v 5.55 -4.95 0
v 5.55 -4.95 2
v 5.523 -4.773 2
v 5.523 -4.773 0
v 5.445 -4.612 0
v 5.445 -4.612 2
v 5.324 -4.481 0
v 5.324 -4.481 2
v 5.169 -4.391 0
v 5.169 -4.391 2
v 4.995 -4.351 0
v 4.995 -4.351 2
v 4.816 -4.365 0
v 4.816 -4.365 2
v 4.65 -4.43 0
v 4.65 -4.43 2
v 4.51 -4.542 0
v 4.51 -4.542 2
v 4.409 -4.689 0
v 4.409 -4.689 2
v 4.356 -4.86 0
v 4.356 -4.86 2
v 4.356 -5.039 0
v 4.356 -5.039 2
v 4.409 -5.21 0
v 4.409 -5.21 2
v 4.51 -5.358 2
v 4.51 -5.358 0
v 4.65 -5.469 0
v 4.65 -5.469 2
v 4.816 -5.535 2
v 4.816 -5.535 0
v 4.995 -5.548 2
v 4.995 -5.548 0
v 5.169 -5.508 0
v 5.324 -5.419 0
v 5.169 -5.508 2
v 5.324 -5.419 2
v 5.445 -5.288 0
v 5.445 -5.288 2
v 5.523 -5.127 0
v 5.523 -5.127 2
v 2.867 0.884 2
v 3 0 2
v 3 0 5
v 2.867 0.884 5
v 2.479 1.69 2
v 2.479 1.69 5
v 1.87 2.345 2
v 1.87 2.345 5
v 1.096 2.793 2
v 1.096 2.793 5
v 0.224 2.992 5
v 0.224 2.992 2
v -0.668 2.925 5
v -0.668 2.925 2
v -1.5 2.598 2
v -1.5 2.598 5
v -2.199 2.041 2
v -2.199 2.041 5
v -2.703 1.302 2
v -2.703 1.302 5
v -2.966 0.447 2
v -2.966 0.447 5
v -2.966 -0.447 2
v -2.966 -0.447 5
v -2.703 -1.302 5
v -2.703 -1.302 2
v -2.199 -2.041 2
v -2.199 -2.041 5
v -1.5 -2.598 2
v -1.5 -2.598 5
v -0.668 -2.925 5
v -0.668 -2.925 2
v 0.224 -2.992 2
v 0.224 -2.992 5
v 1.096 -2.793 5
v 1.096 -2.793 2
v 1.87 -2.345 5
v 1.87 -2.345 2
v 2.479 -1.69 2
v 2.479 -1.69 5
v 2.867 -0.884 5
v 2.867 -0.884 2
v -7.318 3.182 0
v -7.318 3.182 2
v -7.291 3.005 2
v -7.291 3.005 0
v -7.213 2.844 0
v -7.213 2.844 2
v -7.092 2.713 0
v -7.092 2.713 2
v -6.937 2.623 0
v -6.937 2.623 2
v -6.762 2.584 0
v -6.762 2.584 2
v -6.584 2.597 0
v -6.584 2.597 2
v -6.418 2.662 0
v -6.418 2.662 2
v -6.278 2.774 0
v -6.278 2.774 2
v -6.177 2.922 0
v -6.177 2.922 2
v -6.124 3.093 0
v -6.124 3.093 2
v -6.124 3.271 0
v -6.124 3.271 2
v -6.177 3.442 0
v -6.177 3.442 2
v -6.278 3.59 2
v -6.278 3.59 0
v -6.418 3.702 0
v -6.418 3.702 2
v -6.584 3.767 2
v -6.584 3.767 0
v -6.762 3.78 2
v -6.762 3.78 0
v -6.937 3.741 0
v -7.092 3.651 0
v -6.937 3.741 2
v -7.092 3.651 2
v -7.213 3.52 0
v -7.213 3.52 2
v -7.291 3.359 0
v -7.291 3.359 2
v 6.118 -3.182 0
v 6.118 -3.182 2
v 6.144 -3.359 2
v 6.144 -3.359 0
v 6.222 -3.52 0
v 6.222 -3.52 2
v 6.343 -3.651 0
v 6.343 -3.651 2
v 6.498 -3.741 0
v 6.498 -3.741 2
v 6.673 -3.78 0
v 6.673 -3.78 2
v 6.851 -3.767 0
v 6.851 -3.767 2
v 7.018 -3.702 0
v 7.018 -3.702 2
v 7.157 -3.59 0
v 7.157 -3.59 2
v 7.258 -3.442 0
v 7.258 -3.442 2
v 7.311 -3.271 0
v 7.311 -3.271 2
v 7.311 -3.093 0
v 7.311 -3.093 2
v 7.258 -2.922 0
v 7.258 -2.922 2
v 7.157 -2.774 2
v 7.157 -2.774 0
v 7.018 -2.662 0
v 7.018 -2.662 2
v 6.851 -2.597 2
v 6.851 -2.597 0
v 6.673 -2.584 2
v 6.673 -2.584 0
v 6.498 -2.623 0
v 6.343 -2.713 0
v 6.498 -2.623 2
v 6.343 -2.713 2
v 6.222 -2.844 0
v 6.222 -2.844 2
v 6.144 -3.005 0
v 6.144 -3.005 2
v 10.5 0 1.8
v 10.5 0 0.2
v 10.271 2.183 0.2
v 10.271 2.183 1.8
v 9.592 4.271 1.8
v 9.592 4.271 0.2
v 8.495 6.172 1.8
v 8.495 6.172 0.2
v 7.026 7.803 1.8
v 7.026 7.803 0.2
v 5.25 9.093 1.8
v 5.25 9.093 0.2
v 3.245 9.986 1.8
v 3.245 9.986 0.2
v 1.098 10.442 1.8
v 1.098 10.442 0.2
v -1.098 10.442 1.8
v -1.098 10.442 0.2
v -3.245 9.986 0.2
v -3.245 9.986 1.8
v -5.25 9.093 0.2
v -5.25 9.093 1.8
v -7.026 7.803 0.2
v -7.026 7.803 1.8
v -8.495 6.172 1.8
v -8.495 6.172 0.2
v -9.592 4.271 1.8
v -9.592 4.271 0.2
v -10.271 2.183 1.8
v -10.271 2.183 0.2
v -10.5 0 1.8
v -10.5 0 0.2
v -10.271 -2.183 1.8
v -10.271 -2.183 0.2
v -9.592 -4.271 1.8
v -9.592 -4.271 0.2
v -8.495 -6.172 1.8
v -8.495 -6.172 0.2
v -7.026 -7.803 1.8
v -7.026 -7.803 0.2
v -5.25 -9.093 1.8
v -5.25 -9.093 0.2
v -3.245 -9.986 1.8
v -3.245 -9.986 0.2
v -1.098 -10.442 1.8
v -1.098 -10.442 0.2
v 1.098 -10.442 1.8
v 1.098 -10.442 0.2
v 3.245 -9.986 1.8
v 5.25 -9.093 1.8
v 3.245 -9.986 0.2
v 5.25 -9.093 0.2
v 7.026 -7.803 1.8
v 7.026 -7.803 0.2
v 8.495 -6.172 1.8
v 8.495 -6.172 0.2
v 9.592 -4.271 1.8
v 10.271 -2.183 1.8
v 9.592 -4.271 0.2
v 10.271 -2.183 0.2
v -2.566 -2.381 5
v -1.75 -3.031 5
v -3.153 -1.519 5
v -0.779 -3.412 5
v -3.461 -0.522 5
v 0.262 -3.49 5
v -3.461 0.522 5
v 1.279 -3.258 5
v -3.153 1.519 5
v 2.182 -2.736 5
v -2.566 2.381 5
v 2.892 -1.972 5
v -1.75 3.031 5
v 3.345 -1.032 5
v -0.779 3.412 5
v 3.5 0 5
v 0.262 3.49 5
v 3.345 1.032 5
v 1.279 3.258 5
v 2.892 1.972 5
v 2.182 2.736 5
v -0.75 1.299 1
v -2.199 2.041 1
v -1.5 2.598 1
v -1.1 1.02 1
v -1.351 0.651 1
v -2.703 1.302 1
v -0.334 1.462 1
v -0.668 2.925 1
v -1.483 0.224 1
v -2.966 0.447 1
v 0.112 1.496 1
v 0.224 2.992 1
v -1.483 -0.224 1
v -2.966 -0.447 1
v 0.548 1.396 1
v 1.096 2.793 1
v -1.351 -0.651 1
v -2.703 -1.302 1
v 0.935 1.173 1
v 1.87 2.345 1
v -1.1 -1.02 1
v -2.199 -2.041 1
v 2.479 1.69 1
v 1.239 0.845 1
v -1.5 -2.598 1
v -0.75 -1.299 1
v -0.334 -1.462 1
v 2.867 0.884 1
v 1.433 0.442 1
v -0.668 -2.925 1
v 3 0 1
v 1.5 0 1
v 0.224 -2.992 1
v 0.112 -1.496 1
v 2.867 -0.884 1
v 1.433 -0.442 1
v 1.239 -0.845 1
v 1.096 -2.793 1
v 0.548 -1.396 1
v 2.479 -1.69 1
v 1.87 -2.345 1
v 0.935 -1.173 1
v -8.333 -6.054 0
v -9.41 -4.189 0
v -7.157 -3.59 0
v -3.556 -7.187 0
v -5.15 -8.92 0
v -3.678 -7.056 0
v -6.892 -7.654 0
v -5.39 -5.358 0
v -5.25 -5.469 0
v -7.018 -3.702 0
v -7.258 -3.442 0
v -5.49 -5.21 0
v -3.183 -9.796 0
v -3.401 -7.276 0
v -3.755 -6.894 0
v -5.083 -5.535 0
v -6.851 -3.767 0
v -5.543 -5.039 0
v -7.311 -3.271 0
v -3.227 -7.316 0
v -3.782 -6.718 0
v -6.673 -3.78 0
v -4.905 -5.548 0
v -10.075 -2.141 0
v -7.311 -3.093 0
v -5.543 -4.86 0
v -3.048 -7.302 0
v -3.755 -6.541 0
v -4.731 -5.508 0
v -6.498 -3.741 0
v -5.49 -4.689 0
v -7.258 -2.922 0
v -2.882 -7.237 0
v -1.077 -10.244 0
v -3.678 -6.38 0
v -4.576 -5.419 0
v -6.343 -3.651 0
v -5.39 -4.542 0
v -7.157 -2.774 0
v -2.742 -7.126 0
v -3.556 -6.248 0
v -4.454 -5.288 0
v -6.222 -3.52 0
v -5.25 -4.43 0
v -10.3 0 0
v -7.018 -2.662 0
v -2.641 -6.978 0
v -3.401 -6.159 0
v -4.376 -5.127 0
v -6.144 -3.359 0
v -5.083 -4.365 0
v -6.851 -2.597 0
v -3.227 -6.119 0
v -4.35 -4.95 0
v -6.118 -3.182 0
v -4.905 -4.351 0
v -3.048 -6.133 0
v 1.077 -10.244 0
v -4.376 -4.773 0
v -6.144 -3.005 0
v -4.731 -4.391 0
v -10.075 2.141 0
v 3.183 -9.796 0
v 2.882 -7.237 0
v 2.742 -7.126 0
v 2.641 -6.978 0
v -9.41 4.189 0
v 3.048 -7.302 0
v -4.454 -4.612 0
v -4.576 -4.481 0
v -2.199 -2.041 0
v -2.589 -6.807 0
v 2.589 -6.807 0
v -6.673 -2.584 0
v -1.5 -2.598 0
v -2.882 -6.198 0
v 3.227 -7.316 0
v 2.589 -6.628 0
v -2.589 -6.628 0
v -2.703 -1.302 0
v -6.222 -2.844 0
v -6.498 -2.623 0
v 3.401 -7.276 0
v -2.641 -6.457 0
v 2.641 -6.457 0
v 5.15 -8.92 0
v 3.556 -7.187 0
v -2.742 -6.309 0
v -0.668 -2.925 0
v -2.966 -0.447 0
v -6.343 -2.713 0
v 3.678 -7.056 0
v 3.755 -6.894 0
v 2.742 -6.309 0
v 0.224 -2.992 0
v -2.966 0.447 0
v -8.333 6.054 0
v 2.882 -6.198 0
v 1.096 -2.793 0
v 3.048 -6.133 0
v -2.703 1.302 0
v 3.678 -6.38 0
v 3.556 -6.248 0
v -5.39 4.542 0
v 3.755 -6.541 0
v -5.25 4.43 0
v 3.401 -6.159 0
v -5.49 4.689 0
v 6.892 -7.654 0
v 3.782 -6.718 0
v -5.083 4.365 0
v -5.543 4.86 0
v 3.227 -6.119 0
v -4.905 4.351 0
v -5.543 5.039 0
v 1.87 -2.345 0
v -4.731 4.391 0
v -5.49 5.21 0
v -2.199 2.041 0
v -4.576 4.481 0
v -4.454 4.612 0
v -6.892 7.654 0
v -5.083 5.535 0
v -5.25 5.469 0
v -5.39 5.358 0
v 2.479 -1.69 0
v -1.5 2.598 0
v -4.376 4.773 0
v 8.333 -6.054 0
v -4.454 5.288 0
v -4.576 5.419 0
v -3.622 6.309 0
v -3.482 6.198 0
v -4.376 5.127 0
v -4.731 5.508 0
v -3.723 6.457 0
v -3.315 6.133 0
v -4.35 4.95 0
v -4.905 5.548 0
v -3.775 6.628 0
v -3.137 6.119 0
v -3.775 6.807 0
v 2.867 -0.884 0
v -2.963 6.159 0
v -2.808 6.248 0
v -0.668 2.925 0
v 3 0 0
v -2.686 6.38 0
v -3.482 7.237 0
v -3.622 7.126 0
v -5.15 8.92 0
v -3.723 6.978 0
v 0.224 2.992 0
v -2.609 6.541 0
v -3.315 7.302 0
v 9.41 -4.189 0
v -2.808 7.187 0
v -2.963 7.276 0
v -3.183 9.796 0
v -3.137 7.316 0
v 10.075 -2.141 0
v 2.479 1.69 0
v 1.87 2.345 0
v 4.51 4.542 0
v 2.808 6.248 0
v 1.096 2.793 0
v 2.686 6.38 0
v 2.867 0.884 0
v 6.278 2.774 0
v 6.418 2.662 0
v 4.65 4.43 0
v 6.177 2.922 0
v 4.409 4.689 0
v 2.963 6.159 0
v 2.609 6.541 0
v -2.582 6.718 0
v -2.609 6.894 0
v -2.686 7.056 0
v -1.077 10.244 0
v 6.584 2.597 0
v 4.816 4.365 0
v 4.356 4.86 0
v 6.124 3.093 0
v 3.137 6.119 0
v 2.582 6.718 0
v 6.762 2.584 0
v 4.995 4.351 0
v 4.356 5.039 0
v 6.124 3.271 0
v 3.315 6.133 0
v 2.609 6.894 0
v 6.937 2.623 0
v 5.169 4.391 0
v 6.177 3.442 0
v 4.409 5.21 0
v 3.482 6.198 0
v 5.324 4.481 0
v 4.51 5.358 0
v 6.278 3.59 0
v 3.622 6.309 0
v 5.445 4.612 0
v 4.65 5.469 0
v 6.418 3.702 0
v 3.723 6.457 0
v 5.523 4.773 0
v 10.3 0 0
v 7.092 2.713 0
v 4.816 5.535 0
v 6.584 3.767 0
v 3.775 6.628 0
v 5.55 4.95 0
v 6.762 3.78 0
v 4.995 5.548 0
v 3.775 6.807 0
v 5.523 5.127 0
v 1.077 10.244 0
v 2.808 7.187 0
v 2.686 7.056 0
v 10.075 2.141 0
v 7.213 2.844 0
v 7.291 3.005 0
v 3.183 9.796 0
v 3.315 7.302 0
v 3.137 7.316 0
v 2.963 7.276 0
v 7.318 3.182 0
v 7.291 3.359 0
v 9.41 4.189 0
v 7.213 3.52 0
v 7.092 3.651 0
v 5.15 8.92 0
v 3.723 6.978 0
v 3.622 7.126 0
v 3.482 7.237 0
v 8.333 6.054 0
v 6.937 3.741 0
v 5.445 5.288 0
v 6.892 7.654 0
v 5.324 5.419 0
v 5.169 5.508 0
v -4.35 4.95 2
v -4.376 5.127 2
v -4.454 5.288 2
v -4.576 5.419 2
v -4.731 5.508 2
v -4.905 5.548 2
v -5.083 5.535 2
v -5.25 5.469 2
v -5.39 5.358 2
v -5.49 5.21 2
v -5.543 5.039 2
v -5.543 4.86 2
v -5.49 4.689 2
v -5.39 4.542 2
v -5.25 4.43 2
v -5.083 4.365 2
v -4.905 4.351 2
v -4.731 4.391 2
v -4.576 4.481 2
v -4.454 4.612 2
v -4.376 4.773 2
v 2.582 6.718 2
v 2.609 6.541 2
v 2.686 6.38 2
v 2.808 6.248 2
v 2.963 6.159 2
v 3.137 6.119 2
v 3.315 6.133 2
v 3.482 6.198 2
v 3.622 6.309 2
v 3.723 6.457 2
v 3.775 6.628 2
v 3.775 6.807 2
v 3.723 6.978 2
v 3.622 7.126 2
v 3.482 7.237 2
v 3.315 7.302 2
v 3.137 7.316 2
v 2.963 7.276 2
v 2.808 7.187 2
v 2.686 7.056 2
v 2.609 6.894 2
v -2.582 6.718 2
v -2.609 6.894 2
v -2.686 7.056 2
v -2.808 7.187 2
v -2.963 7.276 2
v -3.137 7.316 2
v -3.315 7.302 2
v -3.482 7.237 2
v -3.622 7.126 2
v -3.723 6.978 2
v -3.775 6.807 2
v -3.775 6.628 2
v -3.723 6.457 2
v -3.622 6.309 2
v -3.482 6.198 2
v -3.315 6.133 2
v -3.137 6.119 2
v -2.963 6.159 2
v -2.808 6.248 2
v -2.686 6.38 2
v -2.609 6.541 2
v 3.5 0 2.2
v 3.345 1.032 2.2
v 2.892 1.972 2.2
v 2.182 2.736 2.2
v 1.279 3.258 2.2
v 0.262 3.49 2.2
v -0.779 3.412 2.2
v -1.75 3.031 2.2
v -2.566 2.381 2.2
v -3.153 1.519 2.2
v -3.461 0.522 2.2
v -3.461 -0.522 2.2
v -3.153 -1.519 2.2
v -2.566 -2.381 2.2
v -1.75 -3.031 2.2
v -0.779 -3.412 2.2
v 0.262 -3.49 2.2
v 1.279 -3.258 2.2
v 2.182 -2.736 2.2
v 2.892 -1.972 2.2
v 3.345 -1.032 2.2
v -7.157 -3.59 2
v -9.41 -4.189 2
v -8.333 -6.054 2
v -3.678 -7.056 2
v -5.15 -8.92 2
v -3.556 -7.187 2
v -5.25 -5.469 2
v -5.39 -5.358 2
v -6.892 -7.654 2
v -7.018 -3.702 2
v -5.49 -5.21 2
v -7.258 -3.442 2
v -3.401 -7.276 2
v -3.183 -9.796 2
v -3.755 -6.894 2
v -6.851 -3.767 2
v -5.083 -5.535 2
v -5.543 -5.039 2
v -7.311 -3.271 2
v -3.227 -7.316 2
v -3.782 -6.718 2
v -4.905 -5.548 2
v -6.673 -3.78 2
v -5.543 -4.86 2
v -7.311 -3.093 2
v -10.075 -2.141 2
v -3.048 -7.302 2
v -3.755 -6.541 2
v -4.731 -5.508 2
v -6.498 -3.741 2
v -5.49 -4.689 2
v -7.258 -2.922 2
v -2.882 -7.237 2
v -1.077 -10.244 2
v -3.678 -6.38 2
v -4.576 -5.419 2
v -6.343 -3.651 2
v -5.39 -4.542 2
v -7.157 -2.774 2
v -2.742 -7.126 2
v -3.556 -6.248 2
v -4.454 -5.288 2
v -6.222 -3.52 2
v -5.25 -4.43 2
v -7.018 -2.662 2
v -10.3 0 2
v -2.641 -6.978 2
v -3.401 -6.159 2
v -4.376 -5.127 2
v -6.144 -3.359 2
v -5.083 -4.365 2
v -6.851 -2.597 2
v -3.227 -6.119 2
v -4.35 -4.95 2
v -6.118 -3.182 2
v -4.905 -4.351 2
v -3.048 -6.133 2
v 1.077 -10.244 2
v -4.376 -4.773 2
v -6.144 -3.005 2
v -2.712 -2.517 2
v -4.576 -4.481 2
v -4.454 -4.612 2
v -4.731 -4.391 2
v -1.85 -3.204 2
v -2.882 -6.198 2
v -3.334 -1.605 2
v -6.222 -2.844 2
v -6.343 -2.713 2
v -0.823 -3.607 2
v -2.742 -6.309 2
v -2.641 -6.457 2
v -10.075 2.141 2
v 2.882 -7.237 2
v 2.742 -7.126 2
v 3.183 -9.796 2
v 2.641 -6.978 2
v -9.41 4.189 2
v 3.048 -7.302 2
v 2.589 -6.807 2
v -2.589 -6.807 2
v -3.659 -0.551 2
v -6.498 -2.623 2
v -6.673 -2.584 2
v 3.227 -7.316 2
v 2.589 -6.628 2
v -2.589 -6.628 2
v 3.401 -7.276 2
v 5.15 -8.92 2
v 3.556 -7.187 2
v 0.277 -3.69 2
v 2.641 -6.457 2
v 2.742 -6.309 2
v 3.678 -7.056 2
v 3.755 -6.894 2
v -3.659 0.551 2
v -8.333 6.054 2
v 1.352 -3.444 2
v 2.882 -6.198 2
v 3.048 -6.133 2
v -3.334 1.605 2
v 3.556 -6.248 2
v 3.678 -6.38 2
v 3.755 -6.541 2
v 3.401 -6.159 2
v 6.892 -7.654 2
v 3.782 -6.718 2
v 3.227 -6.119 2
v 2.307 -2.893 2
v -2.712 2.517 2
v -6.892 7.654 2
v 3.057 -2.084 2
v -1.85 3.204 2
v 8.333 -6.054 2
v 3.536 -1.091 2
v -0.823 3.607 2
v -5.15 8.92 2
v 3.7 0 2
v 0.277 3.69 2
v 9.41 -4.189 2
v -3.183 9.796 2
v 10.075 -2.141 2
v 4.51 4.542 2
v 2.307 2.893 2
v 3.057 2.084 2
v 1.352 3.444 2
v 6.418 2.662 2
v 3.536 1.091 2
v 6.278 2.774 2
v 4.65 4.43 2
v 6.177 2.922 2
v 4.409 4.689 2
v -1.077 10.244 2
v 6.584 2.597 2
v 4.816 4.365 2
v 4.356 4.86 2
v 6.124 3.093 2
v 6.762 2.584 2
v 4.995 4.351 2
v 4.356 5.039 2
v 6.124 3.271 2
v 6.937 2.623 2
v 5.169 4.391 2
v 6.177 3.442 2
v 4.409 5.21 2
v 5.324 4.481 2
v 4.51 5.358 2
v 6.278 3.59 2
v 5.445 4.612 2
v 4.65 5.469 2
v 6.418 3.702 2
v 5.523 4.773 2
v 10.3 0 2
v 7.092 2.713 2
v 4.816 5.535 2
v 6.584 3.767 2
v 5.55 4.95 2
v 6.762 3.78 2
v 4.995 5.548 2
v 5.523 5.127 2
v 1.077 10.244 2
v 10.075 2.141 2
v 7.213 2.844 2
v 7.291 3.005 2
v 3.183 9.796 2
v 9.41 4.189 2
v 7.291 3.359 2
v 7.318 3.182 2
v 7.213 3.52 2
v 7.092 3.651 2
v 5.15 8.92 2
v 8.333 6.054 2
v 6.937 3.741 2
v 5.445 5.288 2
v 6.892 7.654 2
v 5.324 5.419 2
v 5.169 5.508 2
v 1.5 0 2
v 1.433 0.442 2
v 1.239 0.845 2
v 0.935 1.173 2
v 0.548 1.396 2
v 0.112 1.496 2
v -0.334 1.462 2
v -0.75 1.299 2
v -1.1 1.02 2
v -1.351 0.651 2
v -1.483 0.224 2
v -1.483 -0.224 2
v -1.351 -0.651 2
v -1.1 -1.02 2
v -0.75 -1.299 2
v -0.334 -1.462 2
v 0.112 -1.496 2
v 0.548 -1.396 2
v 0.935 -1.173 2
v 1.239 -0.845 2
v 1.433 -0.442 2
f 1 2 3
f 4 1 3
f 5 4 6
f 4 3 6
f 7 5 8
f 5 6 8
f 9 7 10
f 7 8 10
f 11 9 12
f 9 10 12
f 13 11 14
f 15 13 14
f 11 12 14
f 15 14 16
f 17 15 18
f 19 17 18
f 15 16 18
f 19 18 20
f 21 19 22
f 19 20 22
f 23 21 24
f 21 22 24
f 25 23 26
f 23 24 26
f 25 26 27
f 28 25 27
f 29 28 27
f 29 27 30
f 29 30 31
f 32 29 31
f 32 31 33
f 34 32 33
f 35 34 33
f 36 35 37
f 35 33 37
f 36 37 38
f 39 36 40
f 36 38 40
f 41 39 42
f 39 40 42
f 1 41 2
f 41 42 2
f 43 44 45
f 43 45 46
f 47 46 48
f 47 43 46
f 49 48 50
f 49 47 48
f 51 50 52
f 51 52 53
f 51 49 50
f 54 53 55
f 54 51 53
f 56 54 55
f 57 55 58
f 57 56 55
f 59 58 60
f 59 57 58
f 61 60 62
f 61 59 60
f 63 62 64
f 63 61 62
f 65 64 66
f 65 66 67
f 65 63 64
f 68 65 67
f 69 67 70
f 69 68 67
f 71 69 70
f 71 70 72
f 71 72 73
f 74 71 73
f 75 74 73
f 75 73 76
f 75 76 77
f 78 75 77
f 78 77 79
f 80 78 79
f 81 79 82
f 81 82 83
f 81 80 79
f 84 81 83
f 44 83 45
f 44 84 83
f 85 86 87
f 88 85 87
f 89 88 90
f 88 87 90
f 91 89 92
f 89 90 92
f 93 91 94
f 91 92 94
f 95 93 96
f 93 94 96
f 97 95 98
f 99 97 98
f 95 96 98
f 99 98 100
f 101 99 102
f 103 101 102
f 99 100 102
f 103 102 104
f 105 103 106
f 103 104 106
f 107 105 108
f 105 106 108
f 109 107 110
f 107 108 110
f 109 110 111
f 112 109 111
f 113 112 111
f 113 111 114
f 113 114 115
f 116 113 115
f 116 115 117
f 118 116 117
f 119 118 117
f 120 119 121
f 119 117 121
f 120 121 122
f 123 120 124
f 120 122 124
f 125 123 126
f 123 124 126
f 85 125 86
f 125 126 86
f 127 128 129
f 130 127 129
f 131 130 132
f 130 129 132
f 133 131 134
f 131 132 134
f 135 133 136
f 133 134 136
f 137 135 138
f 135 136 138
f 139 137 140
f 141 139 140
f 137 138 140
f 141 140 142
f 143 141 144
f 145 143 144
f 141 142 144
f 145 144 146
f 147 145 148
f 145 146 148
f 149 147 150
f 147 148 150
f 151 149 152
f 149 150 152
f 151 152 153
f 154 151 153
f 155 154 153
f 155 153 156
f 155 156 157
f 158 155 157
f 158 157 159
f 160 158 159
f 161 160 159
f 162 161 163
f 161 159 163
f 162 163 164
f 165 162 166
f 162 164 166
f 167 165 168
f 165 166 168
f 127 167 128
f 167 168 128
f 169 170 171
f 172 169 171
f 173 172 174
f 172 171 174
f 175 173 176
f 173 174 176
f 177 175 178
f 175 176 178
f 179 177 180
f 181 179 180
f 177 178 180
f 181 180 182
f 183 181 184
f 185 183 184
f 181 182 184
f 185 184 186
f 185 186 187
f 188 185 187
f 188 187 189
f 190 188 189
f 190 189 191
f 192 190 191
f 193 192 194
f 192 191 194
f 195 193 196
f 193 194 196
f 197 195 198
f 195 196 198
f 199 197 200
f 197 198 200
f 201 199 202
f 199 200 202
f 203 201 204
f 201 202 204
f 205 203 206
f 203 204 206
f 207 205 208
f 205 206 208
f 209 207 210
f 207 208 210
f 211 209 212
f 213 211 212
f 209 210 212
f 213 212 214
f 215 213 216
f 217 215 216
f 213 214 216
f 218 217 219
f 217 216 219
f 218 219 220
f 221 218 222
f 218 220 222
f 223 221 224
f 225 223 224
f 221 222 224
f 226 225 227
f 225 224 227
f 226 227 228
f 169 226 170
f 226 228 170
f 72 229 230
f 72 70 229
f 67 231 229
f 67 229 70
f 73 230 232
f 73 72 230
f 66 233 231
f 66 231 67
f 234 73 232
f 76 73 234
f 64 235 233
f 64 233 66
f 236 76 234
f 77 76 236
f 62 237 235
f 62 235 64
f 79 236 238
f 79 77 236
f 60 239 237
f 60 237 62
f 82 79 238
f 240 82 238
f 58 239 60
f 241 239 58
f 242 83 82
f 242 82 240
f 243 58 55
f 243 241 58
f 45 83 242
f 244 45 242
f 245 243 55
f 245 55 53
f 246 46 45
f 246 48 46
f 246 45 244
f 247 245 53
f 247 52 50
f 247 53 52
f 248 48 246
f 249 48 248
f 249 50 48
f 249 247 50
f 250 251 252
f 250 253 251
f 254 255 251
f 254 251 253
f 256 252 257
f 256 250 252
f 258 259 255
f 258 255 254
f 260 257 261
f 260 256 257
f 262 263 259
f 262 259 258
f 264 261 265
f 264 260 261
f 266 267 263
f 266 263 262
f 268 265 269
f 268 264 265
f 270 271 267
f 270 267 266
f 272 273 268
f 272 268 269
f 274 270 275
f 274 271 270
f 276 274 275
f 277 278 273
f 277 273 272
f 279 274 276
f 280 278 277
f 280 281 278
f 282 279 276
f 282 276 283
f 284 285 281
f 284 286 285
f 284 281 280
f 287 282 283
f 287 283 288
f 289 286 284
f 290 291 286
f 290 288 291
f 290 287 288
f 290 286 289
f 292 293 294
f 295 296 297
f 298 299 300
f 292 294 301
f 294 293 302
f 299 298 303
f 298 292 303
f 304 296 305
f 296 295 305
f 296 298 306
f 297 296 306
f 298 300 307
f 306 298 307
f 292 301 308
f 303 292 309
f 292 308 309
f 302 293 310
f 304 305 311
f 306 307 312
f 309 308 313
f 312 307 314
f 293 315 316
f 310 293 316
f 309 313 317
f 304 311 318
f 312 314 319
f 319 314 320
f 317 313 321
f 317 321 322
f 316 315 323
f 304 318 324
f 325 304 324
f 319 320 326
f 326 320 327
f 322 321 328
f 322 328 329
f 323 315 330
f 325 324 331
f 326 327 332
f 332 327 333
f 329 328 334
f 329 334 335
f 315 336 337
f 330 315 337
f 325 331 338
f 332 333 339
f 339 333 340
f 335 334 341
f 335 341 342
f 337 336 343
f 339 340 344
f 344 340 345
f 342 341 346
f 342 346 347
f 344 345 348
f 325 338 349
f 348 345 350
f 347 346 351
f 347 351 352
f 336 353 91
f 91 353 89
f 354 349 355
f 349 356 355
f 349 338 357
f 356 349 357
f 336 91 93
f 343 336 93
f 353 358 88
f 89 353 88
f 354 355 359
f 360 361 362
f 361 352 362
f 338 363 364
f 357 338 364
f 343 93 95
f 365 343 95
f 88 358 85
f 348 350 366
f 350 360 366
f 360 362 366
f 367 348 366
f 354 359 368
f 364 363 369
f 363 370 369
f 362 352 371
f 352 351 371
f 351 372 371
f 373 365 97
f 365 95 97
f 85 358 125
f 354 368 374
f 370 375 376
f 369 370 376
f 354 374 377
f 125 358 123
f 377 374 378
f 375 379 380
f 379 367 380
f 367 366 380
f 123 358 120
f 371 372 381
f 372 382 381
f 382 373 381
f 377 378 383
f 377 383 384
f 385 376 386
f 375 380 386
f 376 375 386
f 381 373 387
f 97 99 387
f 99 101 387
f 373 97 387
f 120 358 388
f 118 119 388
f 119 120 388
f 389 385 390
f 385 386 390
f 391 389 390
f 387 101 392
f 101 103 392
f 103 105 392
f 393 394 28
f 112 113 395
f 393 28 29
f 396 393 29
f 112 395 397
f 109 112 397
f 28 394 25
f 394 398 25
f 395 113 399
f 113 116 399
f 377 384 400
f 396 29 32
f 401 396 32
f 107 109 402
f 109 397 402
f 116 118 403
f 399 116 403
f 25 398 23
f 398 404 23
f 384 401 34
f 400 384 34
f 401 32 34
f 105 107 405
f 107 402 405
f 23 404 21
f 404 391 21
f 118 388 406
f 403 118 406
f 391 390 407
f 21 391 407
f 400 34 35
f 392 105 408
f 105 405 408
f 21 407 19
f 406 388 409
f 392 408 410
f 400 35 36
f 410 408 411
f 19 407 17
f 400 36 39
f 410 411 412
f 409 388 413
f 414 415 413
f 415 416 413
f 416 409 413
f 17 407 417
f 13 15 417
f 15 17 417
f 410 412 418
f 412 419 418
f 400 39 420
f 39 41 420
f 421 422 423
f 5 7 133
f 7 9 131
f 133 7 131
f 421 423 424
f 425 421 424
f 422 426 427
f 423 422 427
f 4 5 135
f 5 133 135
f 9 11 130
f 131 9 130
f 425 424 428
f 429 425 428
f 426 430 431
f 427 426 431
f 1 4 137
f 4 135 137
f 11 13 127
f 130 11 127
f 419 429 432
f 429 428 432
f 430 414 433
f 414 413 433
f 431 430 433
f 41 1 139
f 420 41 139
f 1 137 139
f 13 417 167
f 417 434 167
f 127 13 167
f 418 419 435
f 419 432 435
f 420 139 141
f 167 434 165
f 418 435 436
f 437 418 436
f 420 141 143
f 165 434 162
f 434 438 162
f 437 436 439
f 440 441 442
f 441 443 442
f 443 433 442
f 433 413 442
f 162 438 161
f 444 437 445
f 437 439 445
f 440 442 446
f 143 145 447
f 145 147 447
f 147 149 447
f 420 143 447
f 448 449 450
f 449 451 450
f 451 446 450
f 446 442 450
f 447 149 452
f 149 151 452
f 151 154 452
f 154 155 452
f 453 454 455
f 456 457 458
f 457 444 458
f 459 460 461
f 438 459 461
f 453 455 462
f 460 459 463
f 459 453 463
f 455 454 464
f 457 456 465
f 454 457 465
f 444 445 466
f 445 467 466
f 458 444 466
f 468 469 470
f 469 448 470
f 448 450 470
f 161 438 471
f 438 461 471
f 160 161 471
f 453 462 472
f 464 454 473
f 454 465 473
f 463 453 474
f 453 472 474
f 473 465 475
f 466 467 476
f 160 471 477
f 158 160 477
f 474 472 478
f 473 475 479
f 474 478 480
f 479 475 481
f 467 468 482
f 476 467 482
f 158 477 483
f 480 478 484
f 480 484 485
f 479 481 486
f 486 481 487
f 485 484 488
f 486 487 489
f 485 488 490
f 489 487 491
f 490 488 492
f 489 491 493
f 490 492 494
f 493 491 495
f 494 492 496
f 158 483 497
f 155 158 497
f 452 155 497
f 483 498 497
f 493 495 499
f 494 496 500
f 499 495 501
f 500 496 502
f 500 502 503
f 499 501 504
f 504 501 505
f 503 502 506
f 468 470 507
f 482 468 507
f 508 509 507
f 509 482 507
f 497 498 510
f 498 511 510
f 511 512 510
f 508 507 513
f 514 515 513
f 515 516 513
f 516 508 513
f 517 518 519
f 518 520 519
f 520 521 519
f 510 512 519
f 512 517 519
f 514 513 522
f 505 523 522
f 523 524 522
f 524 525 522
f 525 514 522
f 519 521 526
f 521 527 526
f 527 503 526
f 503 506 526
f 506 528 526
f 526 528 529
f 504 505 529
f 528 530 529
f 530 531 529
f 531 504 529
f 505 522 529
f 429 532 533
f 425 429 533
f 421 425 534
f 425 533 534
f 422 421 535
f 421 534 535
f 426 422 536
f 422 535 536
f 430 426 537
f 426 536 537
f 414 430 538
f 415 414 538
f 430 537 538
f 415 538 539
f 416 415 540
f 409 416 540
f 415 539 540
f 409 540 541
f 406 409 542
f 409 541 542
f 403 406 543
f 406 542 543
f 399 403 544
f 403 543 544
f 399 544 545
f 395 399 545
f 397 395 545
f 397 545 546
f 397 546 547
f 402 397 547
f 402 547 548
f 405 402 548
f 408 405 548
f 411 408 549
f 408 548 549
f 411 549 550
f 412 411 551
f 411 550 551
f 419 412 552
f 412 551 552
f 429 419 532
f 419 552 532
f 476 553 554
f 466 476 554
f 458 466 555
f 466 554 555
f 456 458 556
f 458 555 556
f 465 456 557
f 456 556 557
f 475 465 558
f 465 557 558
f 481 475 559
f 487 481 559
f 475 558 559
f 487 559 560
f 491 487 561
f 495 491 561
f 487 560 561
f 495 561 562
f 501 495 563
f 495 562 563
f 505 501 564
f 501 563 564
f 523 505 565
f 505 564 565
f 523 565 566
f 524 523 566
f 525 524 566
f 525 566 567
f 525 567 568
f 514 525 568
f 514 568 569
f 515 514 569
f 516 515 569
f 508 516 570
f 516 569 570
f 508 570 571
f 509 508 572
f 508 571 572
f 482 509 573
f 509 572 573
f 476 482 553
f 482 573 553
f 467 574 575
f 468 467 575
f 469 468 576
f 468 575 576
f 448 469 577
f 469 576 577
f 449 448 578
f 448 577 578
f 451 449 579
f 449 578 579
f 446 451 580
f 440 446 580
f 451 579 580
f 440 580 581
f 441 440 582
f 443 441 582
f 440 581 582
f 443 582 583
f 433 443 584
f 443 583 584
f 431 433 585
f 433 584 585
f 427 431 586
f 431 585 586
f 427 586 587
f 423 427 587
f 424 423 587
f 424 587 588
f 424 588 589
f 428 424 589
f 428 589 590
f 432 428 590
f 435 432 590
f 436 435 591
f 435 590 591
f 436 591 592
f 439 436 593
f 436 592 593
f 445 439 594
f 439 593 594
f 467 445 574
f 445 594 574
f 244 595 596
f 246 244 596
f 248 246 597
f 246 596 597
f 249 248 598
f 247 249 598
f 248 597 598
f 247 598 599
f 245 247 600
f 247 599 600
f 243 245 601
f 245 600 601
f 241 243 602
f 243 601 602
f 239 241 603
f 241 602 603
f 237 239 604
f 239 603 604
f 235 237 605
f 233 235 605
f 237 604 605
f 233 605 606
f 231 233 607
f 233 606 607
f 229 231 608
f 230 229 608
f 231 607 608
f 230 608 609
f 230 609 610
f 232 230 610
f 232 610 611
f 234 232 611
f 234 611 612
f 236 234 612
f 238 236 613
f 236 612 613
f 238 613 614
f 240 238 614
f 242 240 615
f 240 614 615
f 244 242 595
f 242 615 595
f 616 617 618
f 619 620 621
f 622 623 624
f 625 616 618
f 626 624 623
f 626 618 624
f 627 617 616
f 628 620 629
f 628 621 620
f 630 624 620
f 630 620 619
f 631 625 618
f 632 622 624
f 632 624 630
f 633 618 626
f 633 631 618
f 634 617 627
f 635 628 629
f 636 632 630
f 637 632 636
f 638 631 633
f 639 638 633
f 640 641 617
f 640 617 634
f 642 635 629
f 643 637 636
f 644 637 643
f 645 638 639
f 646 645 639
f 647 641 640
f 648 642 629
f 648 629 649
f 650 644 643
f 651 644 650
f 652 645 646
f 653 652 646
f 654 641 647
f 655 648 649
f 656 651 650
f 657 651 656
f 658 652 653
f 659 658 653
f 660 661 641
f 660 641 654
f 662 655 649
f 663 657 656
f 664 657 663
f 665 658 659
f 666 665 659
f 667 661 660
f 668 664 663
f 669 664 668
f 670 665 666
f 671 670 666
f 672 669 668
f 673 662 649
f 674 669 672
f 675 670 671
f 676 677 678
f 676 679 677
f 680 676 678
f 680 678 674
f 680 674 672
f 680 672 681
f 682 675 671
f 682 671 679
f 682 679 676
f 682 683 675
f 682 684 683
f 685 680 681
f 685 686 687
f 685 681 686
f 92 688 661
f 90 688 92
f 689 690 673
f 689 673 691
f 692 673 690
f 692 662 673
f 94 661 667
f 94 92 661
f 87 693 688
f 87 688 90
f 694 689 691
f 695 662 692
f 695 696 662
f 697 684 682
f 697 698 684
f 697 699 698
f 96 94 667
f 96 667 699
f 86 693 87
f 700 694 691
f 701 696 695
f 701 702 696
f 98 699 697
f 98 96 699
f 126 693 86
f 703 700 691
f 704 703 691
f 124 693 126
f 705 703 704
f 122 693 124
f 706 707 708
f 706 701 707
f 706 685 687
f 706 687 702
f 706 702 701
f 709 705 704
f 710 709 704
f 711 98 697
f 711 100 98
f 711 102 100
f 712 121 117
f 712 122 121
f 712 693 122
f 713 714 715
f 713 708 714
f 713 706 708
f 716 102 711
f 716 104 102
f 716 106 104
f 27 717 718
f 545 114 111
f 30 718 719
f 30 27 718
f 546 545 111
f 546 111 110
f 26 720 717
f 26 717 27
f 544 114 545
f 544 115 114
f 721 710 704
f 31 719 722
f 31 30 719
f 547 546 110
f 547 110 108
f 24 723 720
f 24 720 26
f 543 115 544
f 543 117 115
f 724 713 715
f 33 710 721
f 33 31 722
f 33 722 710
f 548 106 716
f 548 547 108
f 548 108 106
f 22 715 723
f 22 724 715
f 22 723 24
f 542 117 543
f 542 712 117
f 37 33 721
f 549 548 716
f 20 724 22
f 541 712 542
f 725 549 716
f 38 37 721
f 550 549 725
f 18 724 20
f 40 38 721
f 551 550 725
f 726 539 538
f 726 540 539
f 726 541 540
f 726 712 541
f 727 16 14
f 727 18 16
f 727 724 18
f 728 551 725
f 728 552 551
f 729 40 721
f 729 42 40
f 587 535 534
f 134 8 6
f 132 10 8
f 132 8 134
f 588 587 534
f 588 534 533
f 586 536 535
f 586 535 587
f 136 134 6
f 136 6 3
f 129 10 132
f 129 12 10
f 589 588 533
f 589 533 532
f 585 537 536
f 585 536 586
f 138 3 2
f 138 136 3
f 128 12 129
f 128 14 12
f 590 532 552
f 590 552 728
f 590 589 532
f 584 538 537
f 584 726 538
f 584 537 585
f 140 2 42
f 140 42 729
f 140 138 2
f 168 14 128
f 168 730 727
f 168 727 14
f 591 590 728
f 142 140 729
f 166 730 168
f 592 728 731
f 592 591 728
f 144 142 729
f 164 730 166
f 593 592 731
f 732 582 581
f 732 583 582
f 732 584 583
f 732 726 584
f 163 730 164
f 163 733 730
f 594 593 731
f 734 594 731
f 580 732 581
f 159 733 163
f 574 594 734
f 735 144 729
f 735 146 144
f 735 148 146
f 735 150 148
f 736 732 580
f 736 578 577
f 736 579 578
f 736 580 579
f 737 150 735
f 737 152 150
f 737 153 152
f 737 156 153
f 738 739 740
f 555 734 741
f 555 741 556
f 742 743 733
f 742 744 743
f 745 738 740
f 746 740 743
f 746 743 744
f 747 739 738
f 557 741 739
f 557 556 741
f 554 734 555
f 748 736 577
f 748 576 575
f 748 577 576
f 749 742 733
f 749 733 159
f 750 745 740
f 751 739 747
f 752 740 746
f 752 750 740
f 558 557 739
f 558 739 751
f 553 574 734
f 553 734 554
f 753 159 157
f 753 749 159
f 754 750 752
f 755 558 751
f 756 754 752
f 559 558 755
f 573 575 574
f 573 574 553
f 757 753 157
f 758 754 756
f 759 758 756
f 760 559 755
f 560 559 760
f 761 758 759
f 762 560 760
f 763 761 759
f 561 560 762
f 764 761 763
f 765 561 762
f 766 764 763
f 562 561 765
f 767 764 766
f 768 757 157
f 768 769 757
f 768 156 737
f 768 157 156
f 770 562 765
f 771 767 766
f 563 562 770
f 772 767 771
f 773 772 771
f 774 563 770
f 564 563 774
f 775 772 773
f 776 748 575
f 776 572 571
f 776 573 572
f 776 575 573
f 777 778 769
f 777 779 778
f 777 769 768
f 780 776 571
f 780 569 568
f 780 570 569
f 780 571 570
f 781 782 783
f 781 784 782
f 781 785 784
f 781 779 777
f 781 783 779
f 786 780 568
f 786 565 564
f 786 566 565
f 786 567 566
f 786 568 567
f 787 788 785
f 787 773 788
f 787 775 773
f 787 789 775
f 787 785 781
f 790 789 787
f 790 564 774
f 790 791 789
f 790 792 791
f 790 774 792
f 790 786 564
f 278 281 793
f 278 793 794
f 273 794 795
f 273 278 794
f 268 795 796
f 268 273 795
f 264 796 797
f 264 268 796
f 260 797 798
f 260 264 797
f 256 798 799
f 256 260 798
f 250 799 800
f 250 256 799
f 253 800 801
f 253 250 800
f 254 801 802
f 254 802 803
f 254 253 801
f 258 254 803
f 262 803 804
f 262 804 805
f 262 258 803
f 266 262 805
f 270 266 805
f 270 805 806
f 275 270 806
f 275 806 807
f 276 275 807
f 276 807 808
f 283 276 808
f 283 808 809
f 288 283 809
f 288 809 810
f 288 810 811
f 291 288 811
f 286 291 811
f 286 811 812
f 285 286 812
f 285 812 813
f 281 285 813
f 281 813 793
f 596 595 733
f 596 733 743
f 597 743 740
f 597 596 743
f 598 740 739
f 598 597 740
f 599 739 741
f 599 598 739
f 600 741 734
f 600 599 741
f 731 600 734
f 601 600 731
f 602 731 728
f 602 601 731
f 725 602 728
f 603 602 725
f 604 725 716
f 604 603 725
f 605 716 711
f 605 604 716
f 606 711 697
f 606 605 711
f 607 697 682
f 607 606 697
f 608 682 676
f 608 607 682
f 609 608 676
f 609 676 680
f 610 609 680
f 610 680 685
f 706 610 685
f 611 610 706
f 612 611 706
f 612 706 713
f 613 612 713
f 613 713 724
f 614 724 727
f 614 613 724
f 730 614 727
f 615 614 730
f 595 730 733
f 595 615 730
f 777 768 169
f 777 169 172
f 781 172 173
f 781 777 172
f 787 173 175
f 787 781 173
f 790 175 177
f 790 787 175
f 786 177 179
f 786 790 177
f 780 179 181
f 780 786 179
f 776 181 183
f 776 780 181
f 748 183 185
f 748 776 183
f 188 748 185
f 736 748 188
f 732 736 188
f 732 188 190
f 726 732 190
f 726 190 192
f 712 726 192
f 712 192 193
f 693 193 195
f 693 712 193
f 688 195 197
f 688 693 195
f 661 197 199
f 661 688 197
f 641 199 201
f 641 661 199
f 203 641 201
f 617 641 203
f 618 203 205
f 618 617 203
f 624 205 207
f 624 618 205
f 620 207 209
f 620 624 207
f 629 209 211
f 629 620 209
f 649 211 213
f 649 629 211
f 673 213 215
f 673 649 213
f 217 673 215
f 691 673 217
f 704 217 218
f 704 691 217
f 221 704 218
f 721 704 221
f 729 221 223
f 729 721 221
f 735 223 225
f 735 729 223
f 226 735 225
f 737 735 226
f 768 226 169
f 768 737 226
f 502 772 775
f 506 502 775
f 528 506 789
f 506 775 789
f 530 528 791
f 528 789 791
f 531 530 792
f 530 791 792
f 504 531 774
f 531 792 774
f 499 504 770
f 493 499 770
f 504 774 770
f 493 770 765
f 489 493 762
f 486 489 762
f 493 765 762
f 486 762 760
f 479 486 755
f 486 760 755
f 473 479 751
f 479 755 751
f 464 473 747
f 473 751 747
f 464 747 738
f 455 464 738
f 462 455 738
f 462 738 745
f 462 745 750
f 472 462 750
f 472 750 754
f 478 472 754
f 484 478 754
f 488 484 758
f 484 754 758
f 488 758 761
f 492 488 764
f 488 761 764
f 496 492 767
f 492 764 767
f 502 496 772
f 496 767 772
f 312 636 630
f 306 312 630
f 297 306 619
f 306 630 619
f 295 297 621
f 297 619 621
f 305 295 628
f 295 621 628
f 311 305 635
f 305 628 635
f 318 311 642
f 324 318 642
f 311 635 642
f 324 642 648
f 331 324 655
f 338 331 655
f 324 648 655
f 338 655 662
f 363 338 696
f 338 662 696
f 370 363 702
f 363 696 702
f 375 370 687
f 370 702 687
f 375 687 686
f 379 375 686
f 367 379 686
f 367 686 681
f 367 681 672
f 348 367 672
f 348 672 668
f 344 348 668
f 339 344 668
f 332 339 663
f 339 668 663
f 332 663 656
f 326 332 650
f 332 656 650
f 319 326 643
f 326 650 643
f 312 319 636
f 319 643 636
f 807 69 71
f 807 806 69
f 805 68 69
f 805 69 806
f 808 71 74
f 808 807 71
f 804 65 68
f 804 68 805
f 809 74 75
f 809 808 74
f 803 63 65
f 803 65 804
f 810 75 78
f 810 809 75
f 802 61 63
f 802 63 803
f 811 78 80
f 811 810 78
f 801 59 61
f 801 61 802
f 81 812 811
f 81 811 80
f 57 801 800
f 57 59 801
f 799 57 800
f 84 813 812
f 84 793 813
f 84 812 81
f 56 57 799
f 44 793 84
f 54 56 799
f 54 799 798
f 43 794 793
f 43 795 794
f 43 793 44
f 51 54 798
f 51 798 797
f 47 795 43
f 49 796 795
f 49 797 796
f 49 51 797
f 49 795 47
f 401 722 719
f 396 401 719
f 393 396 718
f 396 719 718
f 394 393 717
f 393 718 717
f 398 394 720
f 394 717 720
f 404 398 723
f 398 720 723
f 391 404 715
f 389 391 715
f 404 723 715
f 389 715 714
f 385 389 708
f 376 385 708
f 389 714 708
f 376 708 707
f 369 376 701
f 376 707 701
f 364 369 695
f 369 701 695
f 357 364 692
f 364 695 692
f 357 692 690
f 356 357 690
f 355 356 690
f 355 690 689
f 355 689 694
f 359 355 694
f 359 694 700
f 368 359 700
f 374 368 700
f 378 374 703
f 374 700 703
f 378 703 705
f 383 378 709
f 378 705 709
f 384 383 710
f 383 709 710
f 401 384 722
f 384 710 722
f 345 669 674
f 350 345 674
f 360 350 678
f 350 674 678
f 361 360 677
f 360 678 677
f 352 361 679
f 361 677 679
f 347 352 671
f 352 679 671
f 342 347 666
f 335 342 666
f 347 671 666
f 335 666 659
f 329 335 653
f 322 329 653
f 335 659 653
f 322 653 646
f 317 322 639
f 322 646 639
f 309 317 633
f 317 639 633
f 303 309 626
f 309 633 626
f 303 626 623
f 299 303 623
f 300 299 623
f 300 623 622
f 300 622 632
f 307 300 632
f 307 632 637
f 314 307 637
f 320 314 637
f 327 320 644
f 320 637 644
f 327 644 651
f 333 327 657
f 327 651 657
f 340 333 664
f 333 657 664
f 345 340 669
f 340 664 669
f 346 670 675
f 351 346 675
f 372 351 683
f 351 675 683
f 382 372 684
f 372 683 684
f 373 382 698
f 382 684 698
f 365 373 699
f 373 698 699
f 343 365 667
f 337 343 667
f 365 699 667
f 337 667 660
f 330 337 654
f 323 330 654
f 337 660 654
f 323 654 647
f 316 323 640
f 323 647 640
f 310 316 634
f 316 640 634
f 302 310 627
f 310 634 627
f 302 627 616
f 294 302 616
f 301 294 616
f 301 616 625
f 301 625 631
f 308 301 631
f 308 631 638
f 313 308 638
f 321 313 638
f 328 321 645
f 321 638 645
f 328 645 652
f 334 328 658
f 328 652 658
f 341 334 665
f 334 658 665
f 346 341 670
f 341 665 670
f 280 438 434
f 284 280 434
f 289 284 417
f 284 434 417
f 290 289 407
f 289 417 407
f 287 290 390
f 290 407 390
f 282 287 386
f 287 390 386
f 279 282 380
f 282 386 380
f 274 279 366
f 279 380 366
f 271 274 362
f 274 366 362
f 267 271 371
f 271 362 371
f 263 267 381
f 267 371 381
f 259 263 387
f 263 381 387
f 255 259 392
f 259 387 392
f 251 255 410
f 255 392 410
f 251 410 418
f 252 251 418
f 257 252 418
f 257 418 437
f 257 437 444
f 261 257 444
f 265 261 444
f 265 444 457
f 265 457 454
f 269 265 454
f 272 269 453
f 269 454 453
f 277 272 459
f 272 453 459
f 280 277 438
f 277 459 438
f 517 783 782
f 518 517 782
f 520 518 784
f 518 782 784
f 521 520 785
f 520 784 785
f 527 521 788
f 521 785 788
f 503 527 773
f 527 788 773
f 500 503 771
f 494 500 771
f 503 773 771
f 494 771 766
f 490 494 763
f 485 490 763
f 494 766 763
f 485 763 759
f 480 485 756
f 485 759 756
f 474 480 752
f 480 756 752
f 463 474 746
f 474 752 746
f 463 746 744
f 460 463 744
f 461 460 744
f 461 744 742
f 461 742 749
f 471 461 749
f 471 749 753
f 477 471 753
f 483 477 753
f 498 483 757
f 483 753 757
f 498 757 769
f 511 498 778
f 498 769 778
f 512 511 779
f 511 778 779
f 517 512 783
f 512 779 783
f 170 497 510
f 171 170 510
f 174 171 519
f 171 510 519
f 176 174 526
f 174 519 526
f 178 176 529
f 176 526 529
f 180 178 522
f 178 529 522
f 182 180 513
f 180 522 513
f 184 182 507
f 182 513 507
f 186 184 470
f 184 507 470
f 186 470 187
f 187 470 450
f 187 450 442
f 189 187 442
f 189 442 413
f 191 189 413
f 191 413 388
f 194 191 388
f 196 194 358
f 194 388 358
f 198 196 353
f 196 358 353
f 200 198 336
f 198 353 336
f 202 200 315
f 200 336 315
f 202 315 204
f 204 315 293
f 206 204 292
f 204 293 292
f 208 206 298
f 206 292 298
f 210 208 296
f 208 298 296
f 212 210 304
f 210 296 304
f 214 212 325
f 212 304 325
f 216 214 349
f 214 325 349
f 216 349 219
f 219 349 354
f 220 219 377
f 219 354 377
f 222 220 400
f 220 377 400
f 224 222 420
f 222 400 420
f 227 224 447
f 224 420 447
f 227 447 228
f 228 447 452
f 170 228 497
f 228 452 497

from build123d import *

# Parameters (mm, degrees)
SKETCH_1_R          = 10.5
SKETCH_1_R_2        = 1.5
EXTRUDE_1_DEPTH     = 2
SKETCH_2_R          = 3.5
SKETCH_2_R_2        = 3
EXTRUDE_2_DEPTH     = 3
SKETCH_3_R          = 3
CUT_EXTRUDE_1_DEPTH = 1
SKETCH_4_R          = 0.6
CUT_EXTRUDE_2_DEPTH = 2
CHAMFER_1_SIZE      = 0.2


with BuildPart() as part:
    # 草图1 → 凸台-拉伸1 (new body)
    with BuildSketch(Plane.XY):
        Circle(SKETCH_1_R)
        Circle(SKETCH_1_R_2, mode=Mode.SUBTRACT)
    extrude(amount=EXTRUDE_1_DEPTH)

    # 草图2 → 凸台-拉伸2 (add)
    with BuildSketch(Plane.XY.offset(2)):
        Circle(SKETCH_2_R)
        Circle(SKETCH_2_R_2, mode=Mode.SUBTRACT)
    extrude(amount=EXTRUDE_2_DEPTH)

    # 草图3 → 切除-拉伸1 (cut)
    with BuildSketch(Plane(origin=(0, 0, 0), x_dir=(-1, 0, 0), z_dir=(0, 0, -1))):
        with Locations(Location((0, 0, 0), (0, 0, 180))):
            Circle(SKETCH_3_R)
    extrude(amount=-CUT_EXTRUDE_1_DEPTH, mode=Mode.SUBTRACT)

    # 草图4 → 切除-拉伸2 (cut)
    with BuildSketch(Plane.XY.offset(2)):
        with Locations((-4.949747468, 4.949747468)):
            Circle(SKETCH_4_R)
        with Locations((4.949747468, 4.949747468)):
            Circle(SKETCH_4_R)
        with Locations((-4.949747468, -4.949747468)):
            Circle(SKETCH_4_R)
        with Locations((4.949747468, -4.949747468)):
            Circle(SKETCH_4_R)
        with Locations((-3.181980515, 6.717514421)):
            Circle(SKETCH_4_R)
        with Locations(Location((-6.717514421, 3.181980515, 0), (0, 0, 180))):
            Circle(SKETCH_4_R)
        with Locations((6.717514421, 3.181980515)):
            Circle(SKETCH_4_R)
        with Locations(Location((3.181980515, 6.717514421, 0), (0, 0, 180))):
            Circle(SKETCH_4_R)
        with Locations((3.181980515, -6.717514421)):
            Circle(SKETCH_4_R)
        with Locations(Location((6.717514421, -3.181980515, 0), (0, 0, 180))):
            Circle(SKETCH_4_R)
        with Locations((-6.717514421, -3.181980515)):
            Circle(SKETCH_4_R)
        with Locations(Location((-3.181980515, -6.717514421, 0), (0, 0, 180))):
            Circle(SKETCH_4_R)
    extrude(amount=-CUT_EXTRUDE_2_DEPTH, mode=Mode.SUBTRACT)

    # 倒角1
    chamfer_1_edges = [part.edges().sort_by_distance(p)[0] for p in [
        (-3.5, 0, 2),
        (-10.5, 0, 0),
        (-10.5, 0, 2),
    ]]
    chamfer(chamfer_1_edges, length=CHAMFER_1_SIZE)


solid = part.part
